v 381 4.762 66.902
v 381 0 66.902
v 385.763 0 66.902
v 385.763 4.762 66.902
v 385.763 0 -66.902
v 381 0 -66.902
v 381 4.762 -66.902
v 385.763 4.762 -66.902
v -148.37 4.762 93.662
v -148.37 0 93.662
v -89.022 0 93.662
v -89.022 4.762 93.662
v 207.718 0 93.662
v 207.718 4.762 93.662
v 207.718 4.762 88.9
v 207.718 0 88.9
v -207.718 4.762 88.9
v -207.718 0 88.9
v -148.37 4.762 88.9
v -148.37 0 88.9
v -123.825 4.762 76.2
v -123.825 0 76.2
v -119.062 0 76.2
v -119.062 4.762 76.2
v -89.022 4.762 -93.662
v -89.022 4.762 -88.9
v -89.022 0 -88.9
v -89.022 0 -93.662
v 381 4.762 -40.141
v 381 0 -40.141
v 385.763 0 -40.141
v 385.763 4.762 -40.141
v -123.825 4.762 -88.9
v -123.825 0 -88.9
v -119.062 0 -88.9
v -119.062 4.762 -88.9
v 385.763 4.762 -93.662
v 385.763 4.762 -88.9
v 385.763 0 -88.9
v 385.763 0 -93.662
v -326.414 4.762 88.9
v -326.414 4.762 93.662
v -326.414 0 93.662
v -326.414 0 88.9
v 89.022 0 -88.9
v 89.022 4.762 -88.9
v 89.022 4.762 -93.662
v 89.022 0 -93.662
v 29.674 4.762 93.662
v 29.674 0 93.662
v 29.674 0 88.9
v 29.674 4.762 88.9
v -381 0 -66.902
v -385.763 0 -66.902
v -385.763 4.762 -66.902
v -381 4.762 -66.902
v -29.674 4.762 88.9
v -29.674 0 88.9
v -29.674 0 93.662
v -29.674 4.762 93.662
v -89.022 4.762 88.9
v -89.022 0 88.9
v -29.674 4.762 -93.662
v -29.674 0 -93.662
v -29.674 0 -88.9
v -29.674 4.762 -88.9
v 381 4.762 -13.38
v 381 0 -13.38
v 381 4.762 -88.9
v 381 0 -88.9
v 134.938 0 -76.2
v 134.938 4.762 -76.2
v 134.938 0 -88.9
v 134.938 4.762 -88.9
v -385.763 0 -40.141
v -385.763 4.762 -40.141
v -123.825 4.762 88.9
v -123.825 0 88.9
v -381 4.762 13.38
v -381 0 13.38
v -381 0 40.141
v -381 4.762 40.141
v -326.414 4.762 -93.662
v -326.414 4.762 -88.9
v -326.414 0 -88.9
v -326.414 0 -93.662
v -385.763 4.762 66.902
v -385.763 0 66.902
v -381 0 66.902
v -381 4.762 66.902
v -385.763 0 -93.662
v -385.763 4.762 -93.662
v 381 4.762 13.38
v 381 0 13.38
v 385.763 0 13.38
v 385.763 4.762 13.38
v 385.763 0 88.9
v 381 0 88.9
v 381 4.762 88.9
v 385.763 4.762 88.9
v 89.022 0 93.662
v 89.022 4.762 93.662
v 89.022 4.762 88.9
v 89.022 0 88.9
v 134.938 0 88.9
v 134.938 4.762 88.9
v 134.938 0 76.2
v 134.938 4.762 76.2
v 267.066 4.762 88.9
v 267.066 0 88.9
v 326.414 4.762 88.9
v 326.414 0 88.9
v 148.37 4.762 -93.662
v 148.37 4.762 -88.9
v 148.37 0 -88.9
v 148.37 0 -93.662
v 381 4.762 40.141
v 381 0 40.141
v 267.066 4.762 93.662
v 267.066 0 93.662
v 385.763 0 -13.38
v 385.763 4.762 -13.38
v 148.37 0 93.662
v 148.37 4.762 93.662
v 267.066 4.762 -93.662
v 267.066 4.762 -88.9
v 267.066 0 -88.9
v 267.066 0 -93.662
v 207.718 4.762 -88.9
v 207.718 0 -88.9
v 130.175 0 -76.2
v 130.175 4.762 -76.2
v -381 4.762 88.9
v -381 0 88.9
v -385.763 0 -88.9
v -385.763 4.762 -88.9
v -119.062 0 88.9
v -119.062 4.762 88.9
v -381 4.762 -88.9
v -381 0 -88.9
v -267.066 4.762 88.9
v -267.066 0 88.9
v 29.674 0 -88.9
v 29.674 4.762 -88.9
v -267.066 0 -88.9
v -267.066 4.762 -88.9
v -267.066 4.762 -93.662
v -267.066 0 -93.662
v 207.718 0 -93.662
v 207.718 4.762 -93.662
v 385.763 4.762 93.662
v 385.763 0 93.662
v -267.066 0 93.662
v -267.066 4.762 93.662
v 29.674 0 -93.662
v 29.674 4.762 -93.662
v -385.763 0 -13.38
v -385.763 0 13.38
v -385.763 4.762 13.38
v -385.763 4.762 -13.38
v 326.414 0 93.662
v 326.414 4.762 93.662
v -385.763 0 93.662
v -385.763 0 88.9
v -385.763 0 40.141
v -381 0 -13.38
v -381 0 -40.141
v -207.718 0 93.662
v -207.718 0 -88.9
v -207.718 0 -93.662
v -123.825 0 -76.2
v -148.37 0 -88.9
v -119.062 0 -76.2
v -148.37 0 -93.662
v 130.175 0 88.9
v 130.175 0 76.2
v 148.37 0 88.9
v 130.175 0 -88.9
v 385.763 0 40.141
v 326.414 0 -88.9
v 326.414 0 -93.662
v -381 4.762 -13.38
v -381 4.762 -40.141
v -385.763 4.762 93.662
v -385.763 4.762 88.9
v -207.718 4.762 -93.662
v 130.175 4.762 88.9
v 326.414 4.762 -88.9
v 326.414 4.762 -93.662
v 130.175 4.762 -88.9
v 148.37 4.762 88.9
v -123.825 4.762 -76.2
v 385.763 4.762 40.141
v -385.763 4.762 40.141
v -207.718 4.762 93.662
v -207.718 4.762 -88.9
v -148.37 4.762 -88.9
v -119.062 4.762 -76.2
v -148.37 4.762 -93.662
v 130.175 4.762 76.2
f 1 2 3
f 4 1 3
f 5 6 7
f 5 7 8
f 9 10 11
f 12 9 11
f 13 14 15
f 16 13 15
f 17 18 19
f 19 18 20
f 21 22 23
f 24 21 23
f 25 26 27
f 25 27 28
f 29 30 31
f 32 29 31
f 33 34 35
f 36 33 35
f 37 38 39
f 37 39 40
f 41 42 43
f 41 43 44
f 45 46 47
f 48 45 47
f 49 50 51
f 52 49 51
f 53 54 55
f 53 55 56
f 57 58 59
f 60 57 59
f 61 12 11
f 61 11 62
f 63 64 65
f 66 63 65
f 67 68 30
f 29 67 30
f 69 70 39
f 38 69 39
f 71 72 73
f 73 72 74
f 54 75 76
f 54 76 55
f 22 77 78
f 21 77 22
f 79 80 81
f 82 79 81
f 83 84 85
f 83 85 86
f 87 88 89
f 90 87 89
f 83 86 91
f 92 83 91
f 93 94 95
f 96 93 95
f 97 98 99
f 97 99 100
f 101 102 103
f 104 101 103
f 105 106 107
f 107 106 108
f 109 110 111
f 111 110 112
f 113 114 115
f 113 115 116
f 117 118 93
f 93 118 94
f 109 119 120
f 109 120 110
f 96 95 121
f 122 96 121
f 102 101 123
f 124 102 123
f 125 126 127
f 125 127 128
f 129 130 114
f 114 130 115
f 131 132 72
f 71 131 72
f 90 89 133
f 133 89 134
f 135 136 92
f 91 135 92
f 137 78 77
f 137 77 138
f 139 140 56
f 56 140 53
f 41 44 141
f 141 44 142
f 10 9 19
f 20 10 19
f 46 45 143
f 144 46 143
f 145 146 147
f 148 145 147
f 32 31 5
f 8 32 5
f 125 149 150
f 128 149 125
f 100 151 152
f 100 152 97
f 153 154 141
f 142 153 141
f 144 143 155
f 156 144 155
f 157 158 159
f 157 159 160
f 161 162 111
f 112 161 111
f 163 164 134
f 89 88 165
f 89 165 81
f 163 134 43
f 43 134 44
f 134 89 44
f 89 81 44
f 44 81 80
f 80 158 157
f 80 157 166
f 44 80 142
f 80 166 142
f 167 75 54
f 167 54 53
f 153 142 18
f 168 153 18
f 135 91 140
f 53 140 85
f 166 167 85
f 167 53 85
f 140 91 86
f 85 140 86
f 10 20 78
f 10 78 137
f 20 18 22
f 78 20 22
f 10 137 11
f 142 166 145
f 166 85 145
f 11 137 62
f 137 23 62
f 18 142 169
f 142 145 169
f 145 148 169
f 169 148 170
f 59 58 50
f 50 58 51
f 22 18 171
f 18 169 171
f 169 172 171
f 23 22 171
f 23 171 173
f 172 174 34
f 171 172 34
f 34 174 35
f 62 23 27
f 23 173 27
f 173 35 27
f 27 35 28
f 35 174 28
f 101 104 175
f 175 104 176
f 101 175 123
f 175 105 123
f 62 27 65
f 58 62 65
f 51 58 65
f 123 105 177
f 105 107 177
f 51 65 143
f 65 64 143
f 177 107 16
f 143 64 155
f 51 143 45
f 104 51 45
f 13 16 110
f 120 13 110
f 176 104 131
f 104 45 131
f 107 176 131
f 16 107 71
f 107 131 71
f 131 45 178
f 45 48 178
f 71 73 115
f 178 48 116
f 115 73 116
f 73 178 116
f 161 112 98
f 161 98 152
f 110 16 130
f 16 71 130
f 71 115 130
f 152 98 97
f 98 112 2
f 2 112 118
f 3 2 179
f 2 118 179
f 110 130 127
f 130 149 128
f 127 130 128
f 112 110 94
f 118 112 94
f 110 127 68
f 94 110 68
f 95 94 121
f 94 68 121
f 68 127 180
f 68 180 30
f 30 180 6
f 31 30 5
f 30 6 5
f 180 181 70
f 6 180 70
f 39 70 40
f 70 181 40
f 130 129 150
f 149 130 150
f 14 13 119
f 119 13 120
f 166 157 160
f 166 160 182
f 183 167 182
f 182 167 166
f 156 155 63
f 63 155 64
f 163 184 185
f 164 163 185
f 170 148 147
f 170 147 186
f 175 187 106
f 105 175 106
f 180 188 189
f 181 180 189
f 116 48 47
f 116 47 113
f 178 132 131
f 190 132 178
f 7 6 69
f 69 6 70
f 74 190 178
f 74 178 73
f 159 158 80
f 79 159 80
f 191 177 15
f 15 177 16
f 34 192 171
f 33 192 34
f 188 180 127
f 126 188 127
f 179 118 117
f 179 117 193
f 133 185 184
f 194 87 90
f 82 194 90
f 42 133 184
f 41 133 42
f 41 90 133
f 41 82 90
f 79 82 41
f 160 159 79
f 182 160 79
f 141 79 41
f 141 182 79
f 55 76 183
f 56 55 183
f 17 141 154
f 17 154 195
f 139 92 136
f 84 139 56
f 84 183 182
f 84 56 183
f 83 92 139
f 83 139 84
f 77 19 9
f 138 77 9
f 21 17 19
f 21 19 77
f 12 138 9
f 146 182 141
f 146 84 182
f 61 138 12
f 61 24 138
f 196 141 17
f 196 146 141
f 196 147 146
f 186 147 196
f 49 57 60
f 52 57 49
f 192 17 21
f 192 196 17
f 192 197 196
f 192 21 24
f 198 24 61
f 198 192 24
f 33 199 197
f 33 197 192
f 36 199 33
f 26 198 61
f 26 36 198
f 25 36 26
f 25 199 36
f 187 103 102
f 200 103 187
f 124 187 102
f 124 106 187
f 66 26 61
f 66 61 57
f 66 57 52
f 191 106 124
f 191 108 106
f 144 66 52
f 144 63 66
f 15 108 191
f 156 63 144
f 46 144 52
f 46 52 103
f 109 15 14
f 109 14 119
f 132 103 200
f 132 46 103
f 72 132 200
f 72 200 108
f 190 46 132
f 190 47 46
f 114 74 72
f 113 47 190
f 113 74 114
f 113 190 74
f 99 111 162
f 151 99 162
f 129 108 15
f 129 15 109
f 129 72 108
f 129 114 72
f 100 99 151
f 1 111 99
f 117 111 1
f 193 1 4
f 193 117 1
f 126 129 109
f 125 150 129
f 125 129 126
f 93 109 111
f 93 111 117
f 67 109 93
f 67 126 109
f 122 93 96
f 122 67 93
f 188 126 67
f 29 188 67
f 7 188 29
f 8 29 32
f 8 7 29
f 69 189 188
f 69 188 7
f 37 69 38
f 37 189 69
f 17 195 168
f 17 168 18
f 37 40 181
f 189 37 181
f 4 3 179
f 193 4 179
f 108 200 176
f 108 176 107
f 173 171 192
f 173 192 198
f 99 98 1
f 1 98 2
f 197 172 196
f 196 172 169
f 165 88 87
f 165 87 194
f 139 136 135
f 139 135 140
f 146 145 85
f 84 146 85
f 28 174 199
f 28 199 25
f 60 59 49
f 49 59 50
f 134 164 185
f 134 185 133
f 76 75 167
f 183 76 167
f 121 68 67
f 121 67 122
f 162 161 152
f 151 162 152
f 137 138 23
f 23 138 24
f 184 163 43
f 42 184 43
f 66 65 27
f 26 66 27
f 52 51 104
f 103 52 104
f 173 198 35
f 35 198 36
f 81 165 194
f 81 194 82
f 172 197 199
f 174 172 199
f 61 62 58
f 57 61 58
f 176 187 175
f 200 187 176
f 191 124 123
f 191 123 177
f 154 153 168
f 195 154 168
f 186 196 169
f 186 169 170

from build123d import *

# Parameters (mm, degrees)
SKETCH1_W           = 54.585576923
SKETCH1_H           = 4.7625
SKETCH1_W_2         = 4.7625
SKETCH1_W_3         = 59.348076923
SKETCH1_H_2         = 26.760714285
SKETCH1_H_3         = 26.760714286
BOSS_EXTRUDE1_DEPTH = 4.7625
SKETCH2_W           = 4.7625
SKETCH2_H           = 12.7
CUT_EXTRUDE1_DEPTH  = 397.998805689


with BuildPart() as part:
    # Sketch1 → Boss-Extrude1 (new body)
    with BuildSketch(Plane(origin=(0, 0, 0), x_dir=(1, 0, 0), z_dir=(0, 1, 0))):
        Polygon((0, -88.9), (0, 88.9), (-29.674038462, 88.9), (-89.022115385, 88.9), (-148.370192308, 88.9), (-207.718269231, 88.9), (-267.066346154, 88.9), (-326.414423077, 88.9), (-381, 88.9), (-381, 66.901785714), (-381, 40.141071429), (-381, 13.380357143), (-381, -13.380357143), (-381, -40.141071429), (-381, -66.901785714), (-381, -88.9), (-326.414423077, -88.9), (-267.066346154, -88.9), (-207.718269231, -88.9), (-148.370192308, -88.9), (-89.022115385, -88.9), (-29.674038462, -88.9), align=None)
        Polygon((29.674038462, 88.9), (0, 88.9), (0, -88.9), (29.674038462, -88.9), (89.022115385, -88.9), (148.370192308, -88.9), (207.718269231, -88.9), (267.066346154, -88.9), (326.414423077, -88.9), (381, -88.9), (381, -66.901785714), (381, -40.141071429), (381, -13.380357143), (381, 13.380357143), (381, 40.141071429), (381, 66.901785714), (381, 88.9), (326.414423077, 88.9), (267.066346154, 88.9), (207.718269231, 88.9), (148.370192308, 88.9), (89.022115385, 88.9), align=None)
        with Locations((-353.707211539, -91.28125)):
            Rectangle(SKETCH1_W, SKETCH1_H)
        with Locations((-383.38125, -91.28125)):
            Rectangle(SKETCH1_W_2, SKETCH1_H)
        with Locations((-237.392307693, -91.28125)):
            Rectangle(SKETCH1_W_3, SKETCH1_H)
        with Locations((-383.38125, -53.521428571)):
            Rectangle(SKETCH1_W_2, SKETCH1_H_2)
        with Locations((-118.696153847, -91.28125)):
            Rectangle(SKETCH1_W_3, SKETCH1_H)
        with Locations((-383.38125, 0)):
            Rectangle(SKETCH1_W_2, SKETCH1_H_3)
        with Locations((-383.38125, 53.521428571)):
            Rectangle(SKETCH1_W_2, SKETCH1_H_2)
        with Locations((-383.38125, 91.28125)):
            Rectangle(SKETCH1_W_2, SKETCH1_H)
        with Locations((-353.707211539, 91.28125)):
            Rectangle(SKETCH1_W, SKETCH1_H)
        with Locations((-237.392307693, 91.28125)):
            Rectangle(SKETCH1_W_3, SKETCH1_H)
        with Locations((-118.696153847, 91.28125)):
            Rectangle(SKETCH1_W_3, SKETCH1_H)
        Polygon((-29.674038462, 88.9), (0, 88.9), (29.674038462, 88.9), (29.674038462, 93.6625), (-29.674038462, 93.6625), align=None)
        with Locations((118.696153847, 91.28125)):
            Rectangle(SKETCH1_W_3, SKETCH1_H)
        Polygon((29.674038462, -88.9), (0, -88.9), (-29.674038462, -88.9), (-29.674038462, -93.6625), (29.674038462, -93.6625), align=None)
        with Locations((118.696153847, -91.28125)):
            Rectangle(SKETCH1_W_3, SKETCH1_H)
        with Locations((237.392307693, -91.28125)):
            Rectangle(SKETCH1_W_3, SKETCH1_H)
        with Locations((237.392307693, 91.28125)):
            Rectangle(SKETCH1_W_3, SKETCH1_H)
        with Locations((383.38125, 91.28125)):
            Rectangle(SKETCH1_W_2, SKETCH1_H)
        with Locations((383.38125, 53.521428571)):
            Rectangle(SKETCH1_W_2, SKETCH1_H_2)
        with Locations((383.38125, 0)):
            Rectangle(SKETCH1_W_2, SKETCH1_H_3)
        with Locations((383.38125, -53.521428571)):
            Rectangle(SKETCH1_W_2, SKETCH1_H_2)
        with Locations((383.38125, -91.28125)):
            Rectangle(SKETCH1_W_2, SKETCH1_H)
        with Locations((356.088461539, -91.28125)):
            Rectangle(SKETCH1_W_3, SKETCH1_H)
        with Locations((356.088461539, 91.28125)):
            Rectangle(SKETCH1_W_3, SKETCH1_H)
    extrude(amount=BOSS_EXTRUDE1_DEPTH)

    # Sketch2 → Cut-Extrude1 (cut, through all)
    with BuildSketch(Plane(origin=(0, 4.7625, 0), x_dir=(1, 0, 0), z_dir=(0, 1, 0))):
        with Locations((-121.44375, 82.55)):
            Rectangle(SKETCH2_W, SKETCH2_H)
        with Locations((-121.44375, -82.55)):
            Rectangle(SKETCH2_W, SKETCH2_H)
        with Locations((132.55625, 82.55)):
            Rectangle(SKETCH2_W, SKETCH2_H)
        with Locations((132.55625, -82.55)):
            Rectangle(SKETCH2_W, SKETCH2_H)
    extrude(amount=-CUT_EXTRUDE1_DEPTH, mode=Mode.SUBTRACT)


solid = part.part
